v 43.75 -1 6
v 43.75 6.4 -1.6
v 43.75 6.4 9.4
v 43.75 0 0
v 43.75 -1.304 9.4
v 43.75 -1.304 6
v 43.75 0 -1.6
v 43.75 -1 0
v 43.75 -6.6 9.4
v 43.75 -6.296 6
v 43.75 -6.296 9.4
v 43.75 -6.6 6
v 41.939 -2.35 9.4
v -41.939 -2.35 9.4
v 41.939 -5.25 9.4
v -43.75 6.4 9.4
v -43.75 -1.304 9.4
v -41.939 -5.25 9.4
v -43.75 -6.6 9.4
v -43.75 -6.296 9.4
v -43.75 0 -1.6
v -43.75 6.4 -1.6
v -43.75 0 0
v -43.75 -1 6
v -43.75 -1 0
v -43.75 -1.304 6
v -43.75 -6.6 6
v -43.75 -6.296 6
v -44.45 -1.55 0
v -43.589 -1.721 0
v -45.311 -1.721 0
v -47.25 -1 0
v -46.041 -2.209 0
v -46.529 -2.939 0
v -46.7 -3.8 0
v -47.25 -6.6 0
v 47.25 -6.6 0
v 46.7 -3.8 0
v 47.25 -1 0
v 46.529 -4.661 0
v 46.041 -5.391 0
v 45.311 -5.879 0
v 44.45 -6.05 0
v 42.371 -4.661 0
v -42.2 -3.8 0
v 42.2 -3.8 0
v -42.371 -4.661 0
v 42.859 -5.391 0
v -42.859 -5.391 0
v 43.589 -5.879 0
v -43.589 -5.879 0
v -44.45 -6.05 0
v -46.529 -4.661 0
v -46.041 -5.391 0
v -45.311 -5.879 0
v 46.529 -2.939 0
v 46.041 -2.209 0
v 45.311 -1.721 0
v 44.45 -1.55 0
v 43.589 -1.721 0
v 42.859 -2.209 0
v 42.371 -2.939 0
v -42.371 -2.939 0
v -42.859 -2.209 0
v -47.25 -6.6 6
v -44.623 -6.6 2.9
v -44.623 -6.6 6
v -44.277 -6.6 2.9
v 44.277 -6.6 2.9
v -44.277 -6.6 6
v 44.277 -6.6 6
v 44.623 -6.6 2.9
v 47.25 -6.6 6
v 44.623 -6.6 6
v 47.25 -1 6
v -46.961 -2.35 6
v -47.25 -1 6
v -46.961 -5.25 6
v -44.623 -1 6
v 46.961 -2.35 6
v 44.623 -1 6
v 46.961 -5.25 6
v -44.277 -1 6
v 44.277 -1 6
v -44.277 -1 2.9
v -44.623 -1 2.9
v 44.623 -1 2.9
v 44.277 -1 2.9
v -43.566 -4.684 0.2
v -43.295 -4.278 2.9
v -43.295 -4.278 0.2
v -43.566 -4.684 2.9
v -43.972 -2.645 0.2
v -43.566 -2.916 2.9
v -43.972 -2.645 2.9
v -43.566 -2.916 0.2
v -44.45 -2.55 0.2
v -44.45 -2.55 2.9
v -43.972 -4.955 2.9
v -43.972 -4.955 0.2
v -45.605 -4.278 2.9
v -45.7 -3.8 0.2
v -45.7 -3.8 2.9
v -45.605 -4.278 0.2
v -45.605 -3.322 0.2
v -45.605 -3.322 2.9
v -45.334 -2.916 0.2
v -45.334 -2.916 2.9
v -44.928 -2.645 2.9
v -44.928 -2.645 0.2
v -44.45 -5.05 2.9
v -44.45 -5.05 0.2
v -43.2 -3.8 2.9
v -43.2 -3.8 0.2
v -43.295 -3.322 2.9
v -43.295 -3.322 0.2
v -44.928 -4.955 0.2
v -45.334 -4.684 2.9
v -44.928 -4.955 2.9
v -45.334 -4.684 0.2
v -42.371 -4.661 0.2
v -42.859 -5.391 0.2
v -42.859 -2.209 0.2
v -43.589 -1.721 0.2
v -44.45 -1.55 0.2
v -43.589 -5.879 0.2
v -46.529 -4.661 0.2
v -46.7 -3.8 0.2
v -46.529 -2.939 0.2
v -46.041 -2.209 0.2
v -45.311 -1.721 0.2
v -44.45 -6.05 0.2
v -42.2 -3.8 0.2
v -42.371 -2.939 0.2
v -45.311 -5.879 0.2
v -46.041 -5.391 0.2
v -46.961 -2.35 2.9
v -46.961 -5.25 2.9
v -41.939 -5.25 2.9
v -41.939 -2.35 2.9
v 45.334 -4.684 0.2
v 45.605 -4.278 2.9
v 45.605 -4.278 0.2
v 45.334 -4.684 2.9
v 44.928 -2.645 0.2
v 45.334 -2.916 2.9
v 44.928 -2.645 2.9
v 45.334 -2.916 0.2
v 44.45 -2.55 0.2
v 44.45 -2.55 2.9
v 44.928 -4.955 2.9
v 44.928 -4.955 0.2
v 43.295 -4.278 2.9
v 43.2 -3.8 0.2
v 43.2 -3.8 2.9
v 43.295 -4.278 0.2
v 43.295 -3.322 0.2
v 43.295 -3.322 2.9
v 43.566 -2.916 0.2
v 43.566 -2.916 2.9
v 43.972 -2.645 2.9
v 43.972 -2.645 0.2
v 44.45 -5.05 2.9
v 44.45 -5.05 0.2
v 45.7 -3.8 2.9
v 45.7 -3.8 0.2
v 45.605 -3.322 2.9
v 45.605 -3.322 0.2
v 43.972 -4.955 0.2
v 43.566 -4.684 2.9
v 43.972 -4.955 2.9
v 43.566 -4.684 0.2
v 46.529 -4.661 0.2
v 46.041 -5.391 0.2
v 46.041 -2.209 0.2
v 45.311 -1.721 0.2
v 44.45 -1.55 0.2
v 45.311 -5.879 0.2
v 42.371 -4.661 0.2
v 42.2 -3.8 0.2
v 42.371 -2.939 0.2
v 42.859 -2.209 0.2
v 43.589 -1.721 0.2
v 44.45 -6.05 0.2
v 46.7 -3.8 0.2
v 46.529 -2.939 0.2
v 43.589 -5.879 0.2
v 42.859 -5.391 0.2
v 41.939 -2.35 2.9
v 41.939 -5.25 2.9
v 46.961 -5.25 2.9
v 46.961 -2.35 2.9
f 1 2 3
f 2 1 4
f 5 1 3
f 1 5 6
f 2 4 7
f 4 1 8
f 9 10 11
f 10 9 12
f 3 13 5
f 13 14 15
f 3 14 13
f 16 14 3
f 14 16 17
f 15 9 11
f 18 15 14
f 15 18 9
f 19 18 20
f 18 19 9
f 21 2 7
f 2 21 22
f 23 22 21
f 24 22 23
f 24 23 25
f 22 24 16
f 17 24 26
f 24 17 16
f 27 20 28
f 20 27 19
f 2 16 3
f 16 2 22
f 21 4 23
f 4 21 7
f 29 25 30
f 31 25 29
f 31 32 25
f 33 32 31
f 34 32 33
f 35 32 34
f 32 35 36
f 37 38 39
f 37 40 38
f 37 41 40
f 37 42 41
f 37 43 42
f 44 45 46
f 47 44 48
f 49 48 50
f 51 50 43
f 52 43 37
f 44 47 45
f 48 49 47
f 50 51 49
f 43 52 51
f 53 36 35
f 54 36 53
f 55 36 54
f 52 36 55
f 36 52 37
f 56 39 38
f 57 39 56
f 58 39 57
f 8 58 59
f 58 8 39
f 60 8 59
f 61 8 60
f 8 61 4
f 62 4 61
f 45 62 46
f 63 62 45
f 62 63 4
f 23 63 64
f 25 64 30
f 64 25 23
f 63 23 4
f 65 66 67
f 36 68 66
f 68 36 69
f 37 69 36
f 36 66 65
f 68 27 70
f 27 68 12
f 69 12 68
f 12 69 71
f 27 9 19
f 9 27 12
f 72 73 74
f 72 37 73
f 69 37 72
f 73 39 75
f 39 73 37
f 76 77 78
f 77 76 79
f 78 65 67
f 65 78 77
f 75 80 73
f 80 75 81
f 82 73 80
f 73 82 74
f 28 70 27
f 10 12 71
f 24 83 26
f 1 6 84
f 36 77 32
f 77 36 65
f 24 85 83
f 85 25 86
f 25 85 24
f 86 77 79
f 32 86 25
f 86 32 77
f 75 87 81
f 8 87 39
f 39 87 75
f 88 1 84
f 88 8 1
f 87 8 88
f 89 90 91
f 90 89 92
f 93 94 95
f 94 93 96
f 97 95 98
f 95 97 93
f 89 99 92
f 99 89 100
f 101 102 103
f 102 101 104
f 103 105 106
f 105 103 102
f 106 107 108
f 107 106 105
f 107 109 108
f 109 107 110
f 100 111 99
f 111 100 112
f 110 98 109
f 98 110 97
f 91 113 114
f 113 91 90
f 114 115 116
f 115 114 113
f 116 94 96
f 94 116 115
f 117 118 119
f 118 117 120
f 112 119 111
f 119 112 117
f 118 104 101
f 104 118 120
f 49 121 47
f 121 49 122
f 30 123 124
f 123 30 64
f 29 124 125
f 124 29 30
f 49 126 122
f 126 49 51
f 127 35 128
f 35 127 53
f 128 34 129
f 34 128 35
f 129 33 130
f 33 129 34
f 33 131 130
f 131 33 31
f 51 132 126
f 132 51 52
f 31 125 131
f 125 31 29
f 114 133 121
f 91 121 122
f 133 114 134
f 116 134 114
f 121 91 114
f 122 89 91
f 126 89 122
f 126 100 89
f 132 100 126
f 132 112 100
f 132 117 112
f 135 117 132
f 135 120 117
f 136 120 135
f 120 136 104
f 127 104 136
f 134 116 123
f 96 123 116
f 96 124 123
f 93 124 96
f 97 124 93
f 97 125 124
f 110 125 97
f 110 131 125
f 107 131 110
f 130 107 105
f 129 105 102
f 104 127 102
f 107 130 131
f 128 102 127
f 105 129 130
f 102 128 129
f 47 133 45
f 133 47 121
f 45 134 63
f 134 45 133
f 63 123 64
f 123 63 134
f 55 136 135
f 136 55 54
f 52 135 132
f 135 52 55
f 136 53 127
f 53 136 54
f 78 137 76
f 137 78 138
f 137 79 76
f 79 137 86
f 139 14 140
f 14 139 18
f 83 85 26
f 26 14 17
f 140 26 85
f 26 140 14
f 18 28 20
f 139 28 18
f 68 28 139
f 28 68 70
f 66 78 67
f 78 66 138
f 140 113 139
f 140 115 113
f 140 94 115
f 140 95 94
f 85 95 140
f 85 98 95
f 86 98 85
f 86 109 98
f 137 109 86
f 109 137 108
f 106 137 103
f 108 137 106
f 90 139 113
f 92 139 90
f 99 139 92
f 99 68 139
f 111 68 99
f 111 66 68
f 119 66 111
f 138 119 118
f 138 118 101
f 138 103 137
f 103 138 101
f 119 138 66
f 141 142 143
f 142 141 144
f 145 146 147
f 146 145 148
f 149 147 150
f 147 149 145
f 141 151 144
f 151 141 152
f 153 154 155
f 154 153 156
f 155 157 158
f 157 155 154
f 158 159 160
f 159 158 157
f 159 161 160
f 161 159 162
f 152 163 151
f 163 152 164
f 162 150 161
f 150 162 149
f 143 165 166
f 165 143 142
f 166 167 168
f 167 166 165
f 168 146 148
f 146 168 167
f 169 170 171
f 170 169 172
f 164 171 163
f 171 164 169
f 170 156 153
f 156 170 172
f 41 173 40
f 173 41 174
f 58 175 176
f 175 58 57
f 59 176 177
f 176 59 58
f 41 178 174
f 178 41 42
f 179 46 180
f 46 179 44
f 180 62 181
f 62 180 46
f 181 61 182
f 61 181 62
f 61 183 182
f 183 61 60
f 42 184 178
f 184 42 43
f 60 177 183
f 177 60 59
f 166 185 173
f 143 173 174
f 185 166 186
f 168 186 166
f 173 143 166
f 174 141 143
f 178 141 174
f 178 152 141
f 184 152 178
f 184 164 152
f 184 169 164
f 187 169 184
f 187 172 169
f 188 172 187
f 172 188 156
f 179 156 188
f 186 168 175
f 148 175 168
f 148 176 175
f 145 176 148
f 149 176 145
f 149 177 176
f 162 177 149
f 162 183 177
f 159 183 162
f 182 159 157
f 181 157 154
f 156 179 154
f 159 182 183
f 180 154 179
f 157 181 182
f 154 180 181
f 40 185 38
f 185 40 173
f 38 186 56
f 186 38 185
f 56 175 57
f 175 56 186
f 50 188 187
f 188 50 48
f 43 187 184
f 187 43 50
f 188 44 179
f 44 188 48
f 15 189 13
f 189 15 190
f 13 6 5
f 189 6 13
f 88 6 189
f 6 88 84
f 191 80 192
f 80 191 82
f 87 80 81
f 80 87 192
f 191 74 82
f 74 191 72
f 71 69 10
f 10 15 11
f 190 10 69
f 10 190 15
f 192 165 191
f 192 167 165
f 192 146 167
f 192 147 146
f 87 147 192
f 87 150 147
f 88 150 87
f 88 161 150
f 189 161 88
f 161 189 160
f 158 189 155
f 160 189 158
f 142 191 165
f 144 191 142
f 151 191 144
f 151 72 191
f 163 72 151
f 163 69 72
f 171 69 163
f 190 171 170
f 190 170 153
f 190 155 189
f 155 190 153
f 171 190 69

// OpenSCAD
// file: ../linurs/linurs_screw_dim.scad
// Metric screws and nuts 
// urs@linurs.org

// contains dimensions of linurs_screw and can be included in other 
// OpenScad files 

// Parameters in this file
// d screw diameter M2_5, M3, ... (enumeration with screw_d)
// t millimeters added to diameters 

// enumerations of metric threads
M2_5=0;
M3=1;
M4=2;
M5=3;

// enumerations screw head type
head_cyl=0; // cylinder
head_cnt=1; // countrsunk
head_no=2;  // no head at all
head_hex=3;  // no head at all

// screw diameters
screw_d=[
2.5, // M2.5
3.0, // M3
4.0, // M4
5.0  // M5
];

// sizes for hex nuts
screw_hex=[
//   s,   e,   h
 [ 5.0, 5.8, 1.7], // M2.5
 [ 5.5, 6.4, 2.0], // M3
 [ 7.0, 8.1, 2.8], // M4
 [ 8.0, 9.2, 3.5]  // M5
];

// sizes for cylinder screw heads
screw_cyl=[
//   d,   h
 [ 4.5, 1.6], // M2.5
 [ 5.5, 2.0], // M3
 [ 7.0, 2.6], // M4
 [ 8.5, 3.3]  // M5
];

// sizes for countersunk screw heads
screw_cnt=[
//   d,   h
 [ 4.7, 1.50], // M2.5
 [ 5.6, 1.65], // M3
 [ 7.4, 2.20], // M4
 [ 9.2, 2.50]  // M5
];
// file: ../linurs/linurs_screw.scad
// Metric screws and nuts 
// urs@linurs.org 2019
// It is targeted for 3D printing applications. 
// To look realistic is not the goal (Example: Nuts do not have a hole)

include <linurs_screw_dim.scad>

d=0; //[0:M2_5,1:M3,2:M4,3:M5]
type=0;//[0:head_cyl,1:head_cnt,2:head_no,3:head_hex]
w=15; 
i=10;
nut_sink=0;
screw_sink=0; 
t=0.01;
fn=16;

/* [hex_bolt] */
show_hex_bolt=false;

/* [nut] */
show_nut=false;

/* [screw] */
show_screw=false;

/* [screw_fix] */
show_screw_fix=false;

/* [screw_cut] */
show_screw_cut=false;

/* [nut_cut] */
show_nut_cut=false;
wi=0; 
rot=false;

// functions used multiple times to position nuts and heads
function headh_cyl(d)=screw_cyl[d][1];  // height of cyl screw head
function headh_cnt(d)=screw_cyl[d][1];  // height of cnt screw head
function headh(d,type=head_cyl)=(type==head_cyl ? headh_cyl(d) : (type==head_cnt ? headh_cnt(d) : 0 )); // height of screw head 

function nuth(d)=screw_hex[d][2];   // height of hex nut

// head of a cylinder screw
module screw_head_cyl(d=M3, t=0)
{
  screwhd=screw_cyl[d][0]+t; // diameter of cylinder screw head
  cylinder(d=screwhd,h=headh(d=d, type=head_cyl), center=true,$fn=16); // screw head
}

// head of a countersunk screw
module screw_head_cnt(d=M3, t=0)
{
  screwd=screw_d[d]+t; 
  screwhd=screw_cnt[d][0]+t; // diameter of cylinder screw head
  cylinder(d1=screwd,d2=screwhd,h=headh(d=d,type=head_cnt), center=true,$fn=16); // screw head
}

// head of a hex screw
module screw_head_hex(d=M3, t=0)
{
    translate([0,0,-nuth(d)/2])nut(d=d, t=t);
}

// head of all screws
module screw_head(d=M3, type=head_cyl, t=0)
{ 
  if(type==head_cnt){
    screw_head_cnt(d=d, t=t);
  } else {
    if(type==head_cyl){
      screw_head_cyl(d=d, t=t);
    } else {
       if(type==head_hex){
           screw_head_hex(d=d, t=t); 
       } 
    }    
  }
}

// hex bolt 
module hex_bolt(d=M3, w=10, t=0)
{
  nutd=screw_hex[d][1]+t; // outer diameter of hex bolt
  cylinder(r=nutd/2,h=w+t, center=true,$fn=6); // nut
}

// nut 
module nut(d=M3, t=0)
{
  hex_bolt(d=d, w=nuth(d), t=t);    
}

// screw 
// w outer width of the screw = screw length + head 
module screw(w=10, d=M3, type=head_cyl, t=0){
  screwd=screw_d[d]+t;       // screw diameter
  cylinder(d=screwd, h=w, center=true,$fn=16); // screw thread length
  translate([0,0,w/2-headh(d=d,type=type)/2])
  screw_head(d=d,type=type, t=t);
}

// screw fix
// w outer width of the screw = screw length + head 
// sink additional material below to remove 
// raise additional material above to remove
module screw_fix(w=10, d=M3, type=head_cyl, screw_sink=0, nut_sink=0, t=0){
  screw(w=w, d=d, type=type, t=t);
  translate([0,0,-w/2+nuth(d)/2])
    nut(d=d,t=t);
  //additional material to be removed above the nut  
  translate([0,0,-(w+nut_sink)/2])hex_bolt(d=d,w=nut_sink+0.01,t=t);    
  //additional material to be removed above the screw head
  if(type==head_cnt){  
    translate([0,0,w/2+screw_sink])
    cylinder(d=screw_cnt[d][0]+t,h=screw_sink+0.01,center=true,$fn=16);
  }else{ 
    translate([0,0,(w+screw_sink)/2])
    cylinder(d=screw_cyl[d][0]+t,h=screw_sink+0.01,center=true,$fn=16);
  }     
}

// screw cut
// material to be extracted from object to slide in a counter sunk screw for fixation
// w height of the cut out
// i depth of the screw
module screw_cut(d=M3,w=20,i=10,t=0,fn=32){
    hsh=screw_cnt[d][1];
    ws=screw_cnt[d][0]+t;
    ds=screw_d[d]+t;
    
    translate([i/2,0,-(w-hsh)/2])
      cube([i,ws,hsh],center=true);
    
    translate([0,0,-(w-hsh)/2])
      cylinder(d=ws,h=hsh,center=true,$fn=32);
    
    translate([0,0,-(w-hsh)/2+hsh])
        cylinder(d2=ds, d1=ws, h=hsh,center=true,$fn=fn);
    
    cylinder(h=w, d=ds, center=true, $fn=fn);   
    
    translate([i/2,0,0]) 
        cube([i,ds,w],center=true);
    
    for(y=[-1,1]){
        translate([i/2,y*ds/2,-w/2+hsh])
            rotate([45,0,0])
            cube([i,sqrt(2)*(ws-ds)/2,sqrt(2)*(ws-ds)/2],center=true);
    }
}
//screw_cut();

// nut cut
// material to be extracted from object to slide in a nut for fixation
// w height of the cylinder
// i lenght of the inlet
module nut_cut(w=10, wi=0, d=M3, i=10, t=0, rot=false,type=head_cyl){ 
  r=(rot)?90:0;
  ds=(rot)?screw_hex[d][1]:screw_hex[d][0];
  rotate([0,0,r])nut(d,t);
  translate([i/2,0,0])
    cube([i,ds+t,nuth(d)+t],center=true);
  translate([0,0,-wi])
      if(type==head_cnt){    
          screw(w=w, d=d, type=type, t=t); 
        translate([0,0,w/2])
          cylinder(d=screw_cnt[d][0]+t,h=raise,center=true,$fn=16);
      }
      else{ 
          screw(w=w, d=d, type=type, t=t);   
  //      translate([0,0,0])
          //#cylinder(d=screw_cyl[d][0]+t,h=w,center=true,$fn=16);
      }       
}

if(show_hex_bolt==true){
   hex_bolt(d=d, w=w, t=t);
}

if(show_nut==true){
  nut(d=d, t=t);
}    

if(show_screw==true){
   screw(w=w, d=d, type=type, t=t);
}

if(show_screw_fix==true){
  screw_fix(w=w, d=d, type=type, nut_sink=nut_sink, screw_sink=screw_sink, t=t);
}

if(show_screw_cut==true){
  screw_cut(d=d,w=w,i=i,t=t,$fn=fn);
}    

if(show_nut_cut==true){
  nut_cut(w=w, wi=wi, d=d, i=i, t=t,rot=rot,type=type);
}  
// file: din41612_male_dim.scad
include <../linurs/linurs_screw_dim.scad>

// connector dimensions
din41612_male_l=94.5;    // lenght of the connector
din41612_male_l1=87.5;   // 
din41612_male_w=13;      // width of the connector
din41612_male_w1=6.4;    // 
din41612_male_w2=5.6;    // 
din41612_male_h=11;      // height of the connector
din41612_male_h1=1.6;    // 
din41612_male_h2=6;      // 

din41612_male_dl=88.9;   // distance between mounting holes
// main file
// din41612 male connector
// =======================

include <din41612_male_dim.scad>

use <../linurs/linurs_screw.scad>

module din41612_male(){ 
  // color("LightGrey")
  difference(){
    union(){
        translate([0,din41612_male_w1/2,din41612_male_h/2-din41612_male_h1])  
        cube([din41612_male_l1,
              din41612_male_w1,
              din41612_male_h],
             center=true);  
      translate([0,(din41612_male_w1-din41612_male_w)/2,(din41612_male_h-din41612_male_h1)/2]) 
        cube([din41612_male_l1,
              (din41612_male_w-din41612_male_w1),
              din41612_male_h-din41612_male_h1],
             center=true);  
      translate([0,din41612_male_w2/2+din41612_male_w1-din41612_male_w,din41612_male_h2/2])
        cube([din41612_male_l,
              din41612_male_w2,
              din41612_male_h2],
             center=true);  
    }
    for(i=[-1,1]){ // mounting holes
      translate([i*din41612_male_dl/2,
                 din41612_male_w1-din41612_male_w+din41612_male_w2/2, 
                 din41612_male_h1])
      rotate([180,0,90])screw_fix(
            w=din41612_male_h2, 
            d=M2_5, 
            type=head_cyl, 
            nut_sink=din41612_male_h,
            t=0);
    }
  }
}
din41612_male();  
